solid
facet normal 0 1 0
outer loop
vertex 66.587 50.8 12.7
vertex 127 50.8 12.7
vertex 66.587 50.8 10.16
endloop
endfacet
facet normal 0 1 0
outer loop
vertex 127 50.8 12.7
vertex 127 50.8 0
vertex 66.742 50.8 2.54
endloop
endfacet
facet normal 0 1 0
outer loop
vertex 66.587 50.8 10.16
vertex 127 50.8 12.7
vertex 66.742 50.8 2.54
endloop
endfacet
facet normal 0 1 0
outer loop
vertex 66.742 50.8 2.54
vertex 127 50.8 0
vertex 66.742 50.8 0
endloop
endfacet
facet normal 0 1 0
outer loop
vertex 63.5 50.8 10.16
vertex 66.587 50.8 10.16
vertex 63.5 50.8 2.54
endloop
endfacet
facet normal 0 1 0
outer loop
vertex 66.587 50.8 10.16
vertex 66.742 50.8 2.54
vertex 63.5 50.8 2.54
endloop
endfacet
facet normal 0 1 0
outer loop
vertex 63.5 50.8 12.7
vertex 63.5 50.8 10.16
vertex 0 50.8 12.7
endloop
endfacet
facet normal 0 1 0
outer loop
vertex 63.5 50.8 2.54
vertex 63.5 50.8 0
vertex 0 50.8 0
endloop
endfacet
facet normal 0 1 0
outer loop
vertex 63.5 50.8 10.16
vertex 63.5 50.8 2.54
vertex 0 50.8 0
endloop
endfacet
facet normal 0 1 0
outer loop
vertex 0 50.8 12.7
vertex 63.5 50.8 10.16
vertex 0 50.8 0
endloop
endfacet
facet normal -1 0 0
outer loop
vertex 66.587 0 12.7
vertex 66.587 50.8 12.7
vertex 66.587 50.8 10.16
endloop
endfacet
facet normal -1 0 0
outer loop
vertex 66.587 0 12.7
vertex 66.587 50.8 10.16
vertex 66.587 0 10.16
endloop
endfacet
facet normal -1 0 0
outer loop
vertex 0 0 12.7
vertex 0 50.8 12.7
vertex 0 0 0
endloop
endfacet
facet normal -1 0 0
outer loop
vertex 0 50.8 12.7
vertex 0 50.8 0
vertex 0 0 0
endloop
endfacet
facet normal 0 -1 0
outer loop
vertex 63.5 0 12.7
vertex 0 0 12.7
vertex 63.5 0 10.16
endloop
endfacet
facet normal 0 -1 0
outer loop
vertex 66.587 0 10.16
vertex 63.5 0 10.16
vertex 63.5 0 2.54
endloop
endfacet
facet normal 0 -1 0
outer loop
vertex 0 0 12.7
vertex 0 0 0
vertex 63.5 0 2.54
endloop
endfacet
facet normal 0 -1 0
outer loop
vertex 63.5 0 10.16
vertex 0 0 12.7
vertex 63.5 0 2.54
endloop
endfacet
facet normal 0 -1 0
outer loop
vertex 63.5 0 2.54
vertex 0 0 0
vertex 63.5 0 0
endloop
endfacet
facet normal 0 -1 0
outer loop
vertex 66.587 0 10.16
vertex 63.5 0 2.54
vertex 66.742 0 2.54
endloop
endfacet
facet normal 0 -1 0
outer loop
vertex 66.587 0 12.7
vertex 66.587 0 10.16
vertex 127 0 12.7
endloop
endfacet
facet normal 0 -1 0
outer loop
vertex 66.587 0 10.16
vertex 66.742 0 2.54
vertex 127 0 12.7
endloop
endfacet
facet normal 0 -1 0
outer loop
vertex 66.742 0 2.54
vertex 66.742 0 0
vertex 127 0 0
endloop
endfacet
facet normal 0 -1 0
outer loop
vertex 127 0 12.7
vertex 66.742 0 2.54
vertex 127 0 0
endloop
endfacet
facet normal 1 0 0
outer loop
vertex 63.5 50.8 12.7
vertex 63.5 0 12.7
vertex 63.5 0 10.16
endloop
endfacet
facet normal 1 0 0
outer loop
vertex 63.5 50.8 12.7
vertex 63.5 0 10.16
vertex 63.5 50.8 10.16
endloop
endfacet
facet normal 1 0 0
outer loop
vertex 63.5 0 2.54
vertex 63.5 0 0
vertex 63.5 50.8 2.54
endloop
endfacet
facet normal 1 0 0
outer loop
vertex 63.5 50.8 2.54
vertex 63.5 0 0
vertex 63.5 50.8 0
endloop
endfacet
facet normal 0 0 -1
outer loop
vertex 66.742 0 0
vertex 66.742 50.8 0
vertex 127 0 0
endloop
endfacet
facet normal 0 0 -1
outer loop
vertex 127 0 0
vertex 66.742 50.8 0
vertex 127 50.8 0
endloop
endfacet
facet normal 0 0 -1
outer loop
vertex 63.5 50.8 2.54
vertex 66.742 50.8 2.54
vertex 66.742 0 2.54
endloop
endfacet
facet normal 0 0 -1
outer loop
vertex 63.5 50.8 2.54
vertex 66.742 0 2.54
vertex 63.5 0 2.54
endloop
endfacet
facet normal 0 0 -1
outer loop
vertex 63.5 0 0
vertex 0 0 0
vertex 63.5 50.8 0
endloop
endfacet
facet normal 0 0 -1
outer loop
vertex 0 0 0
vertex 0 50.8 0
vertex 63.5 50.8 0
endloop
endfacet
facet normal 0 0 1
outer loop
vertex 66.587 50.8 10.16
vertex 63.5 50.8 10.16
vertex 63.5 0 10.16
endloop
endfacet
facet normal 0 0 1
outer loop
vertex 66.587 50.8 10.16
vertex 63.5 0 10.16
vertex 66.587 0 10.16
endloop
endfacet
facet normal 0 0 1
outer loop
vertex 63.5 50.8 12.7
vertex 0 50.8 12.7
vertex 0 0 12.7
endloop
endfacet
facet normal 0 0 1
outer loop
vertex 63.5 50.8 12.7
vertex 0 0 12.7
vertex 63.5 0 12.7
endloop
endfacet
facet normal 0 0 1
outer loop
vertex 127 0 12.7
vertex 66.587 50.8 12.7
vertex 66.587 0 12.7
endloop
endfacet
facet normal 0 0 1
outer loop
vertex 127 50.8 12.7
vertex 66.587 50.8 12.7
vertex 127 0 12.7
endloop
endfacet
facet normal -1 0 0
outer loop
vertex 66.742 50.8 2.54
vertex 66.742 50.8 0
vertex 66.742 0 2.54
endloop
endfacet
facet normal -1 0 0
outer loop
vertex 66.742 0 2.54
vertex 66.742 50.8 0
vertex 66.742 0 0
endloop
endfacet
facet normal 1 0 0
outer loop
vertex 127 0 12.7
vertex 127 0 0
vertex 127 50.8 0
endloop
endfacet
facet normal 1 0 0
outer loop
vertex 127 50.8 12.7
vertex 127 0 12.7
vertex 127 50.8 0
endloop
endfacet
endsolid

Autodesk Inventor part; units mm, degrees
ref_plane "YZ Plane" through (0, 0, 0) normal (1, 0, 0) x (0, 1, 0)
ref_plane "XZ Plane" through (0, 0, 0) normal (0, 1, 0) x (-1, 0, 0)
ref_plane "XY Plane" through (0, 0, 0) normal (0, 0, 1) x (1, 0, 0)
sketch "Sketch1" plane through (0, 0, 0) normal (0, 0, 1) x (1, 0, 0)
  line L0 (0, 0) -> (127, 0)
  line L1 (127, 0) -> (127, 50.8)
  line L2 (127, 50.8) -> (0, 50.8)
  line L3 (0, 50.8) -> (0, 0)
  dimension "d0" = 127
  dimension "d1" = 50.8
extrude "Extrusion1" add sketch "Sketch1" along normal blind 12.7
sketch "Sketch2" plane through (0, 0, 12.7) normal (0, 0, 1) x (1, 0, 0)
  line L0 (127, 0) -> (0, 0) projected
  line L1 (0, 50.8) -> (127, 50.8) projected
  line L2 (63.5, 50.8) -> (66.5874, 50.8)
  line L3 (66.5874, 50.8) -> (66.5874, 0)
  line L4 (66.5874, 0) -> (63.5, 0)
  line L5 (63.5, 0) -> (63.5, 50.8)
extrude "Extrusion2" cut sketch "Sketch2" against normal blind 2.54
sketch "Sketch3" plane through (0, 0, 0) normal (0, 0, -1) x (-1, 0, 0)
  line L0 (0, 0) -> (-127, 0) projected
  line L1 (-127, 50.8) -> (0, 50.8) projected
  line L2 (-63.5, 50.8) -> (-66.7421, 50.8)
  line L3 (-66.7421, 50.8) -> (-66.7421, 0)
  line L4 (-66.7421, 0) -> (-63.5, 0)
  line L5 (-63.5, 0) -> (-63.5, 50.8)
extrude "Extrusion3" cut sketch "Sketch3" against normal blind 2.54
properties part number "Magnet"
